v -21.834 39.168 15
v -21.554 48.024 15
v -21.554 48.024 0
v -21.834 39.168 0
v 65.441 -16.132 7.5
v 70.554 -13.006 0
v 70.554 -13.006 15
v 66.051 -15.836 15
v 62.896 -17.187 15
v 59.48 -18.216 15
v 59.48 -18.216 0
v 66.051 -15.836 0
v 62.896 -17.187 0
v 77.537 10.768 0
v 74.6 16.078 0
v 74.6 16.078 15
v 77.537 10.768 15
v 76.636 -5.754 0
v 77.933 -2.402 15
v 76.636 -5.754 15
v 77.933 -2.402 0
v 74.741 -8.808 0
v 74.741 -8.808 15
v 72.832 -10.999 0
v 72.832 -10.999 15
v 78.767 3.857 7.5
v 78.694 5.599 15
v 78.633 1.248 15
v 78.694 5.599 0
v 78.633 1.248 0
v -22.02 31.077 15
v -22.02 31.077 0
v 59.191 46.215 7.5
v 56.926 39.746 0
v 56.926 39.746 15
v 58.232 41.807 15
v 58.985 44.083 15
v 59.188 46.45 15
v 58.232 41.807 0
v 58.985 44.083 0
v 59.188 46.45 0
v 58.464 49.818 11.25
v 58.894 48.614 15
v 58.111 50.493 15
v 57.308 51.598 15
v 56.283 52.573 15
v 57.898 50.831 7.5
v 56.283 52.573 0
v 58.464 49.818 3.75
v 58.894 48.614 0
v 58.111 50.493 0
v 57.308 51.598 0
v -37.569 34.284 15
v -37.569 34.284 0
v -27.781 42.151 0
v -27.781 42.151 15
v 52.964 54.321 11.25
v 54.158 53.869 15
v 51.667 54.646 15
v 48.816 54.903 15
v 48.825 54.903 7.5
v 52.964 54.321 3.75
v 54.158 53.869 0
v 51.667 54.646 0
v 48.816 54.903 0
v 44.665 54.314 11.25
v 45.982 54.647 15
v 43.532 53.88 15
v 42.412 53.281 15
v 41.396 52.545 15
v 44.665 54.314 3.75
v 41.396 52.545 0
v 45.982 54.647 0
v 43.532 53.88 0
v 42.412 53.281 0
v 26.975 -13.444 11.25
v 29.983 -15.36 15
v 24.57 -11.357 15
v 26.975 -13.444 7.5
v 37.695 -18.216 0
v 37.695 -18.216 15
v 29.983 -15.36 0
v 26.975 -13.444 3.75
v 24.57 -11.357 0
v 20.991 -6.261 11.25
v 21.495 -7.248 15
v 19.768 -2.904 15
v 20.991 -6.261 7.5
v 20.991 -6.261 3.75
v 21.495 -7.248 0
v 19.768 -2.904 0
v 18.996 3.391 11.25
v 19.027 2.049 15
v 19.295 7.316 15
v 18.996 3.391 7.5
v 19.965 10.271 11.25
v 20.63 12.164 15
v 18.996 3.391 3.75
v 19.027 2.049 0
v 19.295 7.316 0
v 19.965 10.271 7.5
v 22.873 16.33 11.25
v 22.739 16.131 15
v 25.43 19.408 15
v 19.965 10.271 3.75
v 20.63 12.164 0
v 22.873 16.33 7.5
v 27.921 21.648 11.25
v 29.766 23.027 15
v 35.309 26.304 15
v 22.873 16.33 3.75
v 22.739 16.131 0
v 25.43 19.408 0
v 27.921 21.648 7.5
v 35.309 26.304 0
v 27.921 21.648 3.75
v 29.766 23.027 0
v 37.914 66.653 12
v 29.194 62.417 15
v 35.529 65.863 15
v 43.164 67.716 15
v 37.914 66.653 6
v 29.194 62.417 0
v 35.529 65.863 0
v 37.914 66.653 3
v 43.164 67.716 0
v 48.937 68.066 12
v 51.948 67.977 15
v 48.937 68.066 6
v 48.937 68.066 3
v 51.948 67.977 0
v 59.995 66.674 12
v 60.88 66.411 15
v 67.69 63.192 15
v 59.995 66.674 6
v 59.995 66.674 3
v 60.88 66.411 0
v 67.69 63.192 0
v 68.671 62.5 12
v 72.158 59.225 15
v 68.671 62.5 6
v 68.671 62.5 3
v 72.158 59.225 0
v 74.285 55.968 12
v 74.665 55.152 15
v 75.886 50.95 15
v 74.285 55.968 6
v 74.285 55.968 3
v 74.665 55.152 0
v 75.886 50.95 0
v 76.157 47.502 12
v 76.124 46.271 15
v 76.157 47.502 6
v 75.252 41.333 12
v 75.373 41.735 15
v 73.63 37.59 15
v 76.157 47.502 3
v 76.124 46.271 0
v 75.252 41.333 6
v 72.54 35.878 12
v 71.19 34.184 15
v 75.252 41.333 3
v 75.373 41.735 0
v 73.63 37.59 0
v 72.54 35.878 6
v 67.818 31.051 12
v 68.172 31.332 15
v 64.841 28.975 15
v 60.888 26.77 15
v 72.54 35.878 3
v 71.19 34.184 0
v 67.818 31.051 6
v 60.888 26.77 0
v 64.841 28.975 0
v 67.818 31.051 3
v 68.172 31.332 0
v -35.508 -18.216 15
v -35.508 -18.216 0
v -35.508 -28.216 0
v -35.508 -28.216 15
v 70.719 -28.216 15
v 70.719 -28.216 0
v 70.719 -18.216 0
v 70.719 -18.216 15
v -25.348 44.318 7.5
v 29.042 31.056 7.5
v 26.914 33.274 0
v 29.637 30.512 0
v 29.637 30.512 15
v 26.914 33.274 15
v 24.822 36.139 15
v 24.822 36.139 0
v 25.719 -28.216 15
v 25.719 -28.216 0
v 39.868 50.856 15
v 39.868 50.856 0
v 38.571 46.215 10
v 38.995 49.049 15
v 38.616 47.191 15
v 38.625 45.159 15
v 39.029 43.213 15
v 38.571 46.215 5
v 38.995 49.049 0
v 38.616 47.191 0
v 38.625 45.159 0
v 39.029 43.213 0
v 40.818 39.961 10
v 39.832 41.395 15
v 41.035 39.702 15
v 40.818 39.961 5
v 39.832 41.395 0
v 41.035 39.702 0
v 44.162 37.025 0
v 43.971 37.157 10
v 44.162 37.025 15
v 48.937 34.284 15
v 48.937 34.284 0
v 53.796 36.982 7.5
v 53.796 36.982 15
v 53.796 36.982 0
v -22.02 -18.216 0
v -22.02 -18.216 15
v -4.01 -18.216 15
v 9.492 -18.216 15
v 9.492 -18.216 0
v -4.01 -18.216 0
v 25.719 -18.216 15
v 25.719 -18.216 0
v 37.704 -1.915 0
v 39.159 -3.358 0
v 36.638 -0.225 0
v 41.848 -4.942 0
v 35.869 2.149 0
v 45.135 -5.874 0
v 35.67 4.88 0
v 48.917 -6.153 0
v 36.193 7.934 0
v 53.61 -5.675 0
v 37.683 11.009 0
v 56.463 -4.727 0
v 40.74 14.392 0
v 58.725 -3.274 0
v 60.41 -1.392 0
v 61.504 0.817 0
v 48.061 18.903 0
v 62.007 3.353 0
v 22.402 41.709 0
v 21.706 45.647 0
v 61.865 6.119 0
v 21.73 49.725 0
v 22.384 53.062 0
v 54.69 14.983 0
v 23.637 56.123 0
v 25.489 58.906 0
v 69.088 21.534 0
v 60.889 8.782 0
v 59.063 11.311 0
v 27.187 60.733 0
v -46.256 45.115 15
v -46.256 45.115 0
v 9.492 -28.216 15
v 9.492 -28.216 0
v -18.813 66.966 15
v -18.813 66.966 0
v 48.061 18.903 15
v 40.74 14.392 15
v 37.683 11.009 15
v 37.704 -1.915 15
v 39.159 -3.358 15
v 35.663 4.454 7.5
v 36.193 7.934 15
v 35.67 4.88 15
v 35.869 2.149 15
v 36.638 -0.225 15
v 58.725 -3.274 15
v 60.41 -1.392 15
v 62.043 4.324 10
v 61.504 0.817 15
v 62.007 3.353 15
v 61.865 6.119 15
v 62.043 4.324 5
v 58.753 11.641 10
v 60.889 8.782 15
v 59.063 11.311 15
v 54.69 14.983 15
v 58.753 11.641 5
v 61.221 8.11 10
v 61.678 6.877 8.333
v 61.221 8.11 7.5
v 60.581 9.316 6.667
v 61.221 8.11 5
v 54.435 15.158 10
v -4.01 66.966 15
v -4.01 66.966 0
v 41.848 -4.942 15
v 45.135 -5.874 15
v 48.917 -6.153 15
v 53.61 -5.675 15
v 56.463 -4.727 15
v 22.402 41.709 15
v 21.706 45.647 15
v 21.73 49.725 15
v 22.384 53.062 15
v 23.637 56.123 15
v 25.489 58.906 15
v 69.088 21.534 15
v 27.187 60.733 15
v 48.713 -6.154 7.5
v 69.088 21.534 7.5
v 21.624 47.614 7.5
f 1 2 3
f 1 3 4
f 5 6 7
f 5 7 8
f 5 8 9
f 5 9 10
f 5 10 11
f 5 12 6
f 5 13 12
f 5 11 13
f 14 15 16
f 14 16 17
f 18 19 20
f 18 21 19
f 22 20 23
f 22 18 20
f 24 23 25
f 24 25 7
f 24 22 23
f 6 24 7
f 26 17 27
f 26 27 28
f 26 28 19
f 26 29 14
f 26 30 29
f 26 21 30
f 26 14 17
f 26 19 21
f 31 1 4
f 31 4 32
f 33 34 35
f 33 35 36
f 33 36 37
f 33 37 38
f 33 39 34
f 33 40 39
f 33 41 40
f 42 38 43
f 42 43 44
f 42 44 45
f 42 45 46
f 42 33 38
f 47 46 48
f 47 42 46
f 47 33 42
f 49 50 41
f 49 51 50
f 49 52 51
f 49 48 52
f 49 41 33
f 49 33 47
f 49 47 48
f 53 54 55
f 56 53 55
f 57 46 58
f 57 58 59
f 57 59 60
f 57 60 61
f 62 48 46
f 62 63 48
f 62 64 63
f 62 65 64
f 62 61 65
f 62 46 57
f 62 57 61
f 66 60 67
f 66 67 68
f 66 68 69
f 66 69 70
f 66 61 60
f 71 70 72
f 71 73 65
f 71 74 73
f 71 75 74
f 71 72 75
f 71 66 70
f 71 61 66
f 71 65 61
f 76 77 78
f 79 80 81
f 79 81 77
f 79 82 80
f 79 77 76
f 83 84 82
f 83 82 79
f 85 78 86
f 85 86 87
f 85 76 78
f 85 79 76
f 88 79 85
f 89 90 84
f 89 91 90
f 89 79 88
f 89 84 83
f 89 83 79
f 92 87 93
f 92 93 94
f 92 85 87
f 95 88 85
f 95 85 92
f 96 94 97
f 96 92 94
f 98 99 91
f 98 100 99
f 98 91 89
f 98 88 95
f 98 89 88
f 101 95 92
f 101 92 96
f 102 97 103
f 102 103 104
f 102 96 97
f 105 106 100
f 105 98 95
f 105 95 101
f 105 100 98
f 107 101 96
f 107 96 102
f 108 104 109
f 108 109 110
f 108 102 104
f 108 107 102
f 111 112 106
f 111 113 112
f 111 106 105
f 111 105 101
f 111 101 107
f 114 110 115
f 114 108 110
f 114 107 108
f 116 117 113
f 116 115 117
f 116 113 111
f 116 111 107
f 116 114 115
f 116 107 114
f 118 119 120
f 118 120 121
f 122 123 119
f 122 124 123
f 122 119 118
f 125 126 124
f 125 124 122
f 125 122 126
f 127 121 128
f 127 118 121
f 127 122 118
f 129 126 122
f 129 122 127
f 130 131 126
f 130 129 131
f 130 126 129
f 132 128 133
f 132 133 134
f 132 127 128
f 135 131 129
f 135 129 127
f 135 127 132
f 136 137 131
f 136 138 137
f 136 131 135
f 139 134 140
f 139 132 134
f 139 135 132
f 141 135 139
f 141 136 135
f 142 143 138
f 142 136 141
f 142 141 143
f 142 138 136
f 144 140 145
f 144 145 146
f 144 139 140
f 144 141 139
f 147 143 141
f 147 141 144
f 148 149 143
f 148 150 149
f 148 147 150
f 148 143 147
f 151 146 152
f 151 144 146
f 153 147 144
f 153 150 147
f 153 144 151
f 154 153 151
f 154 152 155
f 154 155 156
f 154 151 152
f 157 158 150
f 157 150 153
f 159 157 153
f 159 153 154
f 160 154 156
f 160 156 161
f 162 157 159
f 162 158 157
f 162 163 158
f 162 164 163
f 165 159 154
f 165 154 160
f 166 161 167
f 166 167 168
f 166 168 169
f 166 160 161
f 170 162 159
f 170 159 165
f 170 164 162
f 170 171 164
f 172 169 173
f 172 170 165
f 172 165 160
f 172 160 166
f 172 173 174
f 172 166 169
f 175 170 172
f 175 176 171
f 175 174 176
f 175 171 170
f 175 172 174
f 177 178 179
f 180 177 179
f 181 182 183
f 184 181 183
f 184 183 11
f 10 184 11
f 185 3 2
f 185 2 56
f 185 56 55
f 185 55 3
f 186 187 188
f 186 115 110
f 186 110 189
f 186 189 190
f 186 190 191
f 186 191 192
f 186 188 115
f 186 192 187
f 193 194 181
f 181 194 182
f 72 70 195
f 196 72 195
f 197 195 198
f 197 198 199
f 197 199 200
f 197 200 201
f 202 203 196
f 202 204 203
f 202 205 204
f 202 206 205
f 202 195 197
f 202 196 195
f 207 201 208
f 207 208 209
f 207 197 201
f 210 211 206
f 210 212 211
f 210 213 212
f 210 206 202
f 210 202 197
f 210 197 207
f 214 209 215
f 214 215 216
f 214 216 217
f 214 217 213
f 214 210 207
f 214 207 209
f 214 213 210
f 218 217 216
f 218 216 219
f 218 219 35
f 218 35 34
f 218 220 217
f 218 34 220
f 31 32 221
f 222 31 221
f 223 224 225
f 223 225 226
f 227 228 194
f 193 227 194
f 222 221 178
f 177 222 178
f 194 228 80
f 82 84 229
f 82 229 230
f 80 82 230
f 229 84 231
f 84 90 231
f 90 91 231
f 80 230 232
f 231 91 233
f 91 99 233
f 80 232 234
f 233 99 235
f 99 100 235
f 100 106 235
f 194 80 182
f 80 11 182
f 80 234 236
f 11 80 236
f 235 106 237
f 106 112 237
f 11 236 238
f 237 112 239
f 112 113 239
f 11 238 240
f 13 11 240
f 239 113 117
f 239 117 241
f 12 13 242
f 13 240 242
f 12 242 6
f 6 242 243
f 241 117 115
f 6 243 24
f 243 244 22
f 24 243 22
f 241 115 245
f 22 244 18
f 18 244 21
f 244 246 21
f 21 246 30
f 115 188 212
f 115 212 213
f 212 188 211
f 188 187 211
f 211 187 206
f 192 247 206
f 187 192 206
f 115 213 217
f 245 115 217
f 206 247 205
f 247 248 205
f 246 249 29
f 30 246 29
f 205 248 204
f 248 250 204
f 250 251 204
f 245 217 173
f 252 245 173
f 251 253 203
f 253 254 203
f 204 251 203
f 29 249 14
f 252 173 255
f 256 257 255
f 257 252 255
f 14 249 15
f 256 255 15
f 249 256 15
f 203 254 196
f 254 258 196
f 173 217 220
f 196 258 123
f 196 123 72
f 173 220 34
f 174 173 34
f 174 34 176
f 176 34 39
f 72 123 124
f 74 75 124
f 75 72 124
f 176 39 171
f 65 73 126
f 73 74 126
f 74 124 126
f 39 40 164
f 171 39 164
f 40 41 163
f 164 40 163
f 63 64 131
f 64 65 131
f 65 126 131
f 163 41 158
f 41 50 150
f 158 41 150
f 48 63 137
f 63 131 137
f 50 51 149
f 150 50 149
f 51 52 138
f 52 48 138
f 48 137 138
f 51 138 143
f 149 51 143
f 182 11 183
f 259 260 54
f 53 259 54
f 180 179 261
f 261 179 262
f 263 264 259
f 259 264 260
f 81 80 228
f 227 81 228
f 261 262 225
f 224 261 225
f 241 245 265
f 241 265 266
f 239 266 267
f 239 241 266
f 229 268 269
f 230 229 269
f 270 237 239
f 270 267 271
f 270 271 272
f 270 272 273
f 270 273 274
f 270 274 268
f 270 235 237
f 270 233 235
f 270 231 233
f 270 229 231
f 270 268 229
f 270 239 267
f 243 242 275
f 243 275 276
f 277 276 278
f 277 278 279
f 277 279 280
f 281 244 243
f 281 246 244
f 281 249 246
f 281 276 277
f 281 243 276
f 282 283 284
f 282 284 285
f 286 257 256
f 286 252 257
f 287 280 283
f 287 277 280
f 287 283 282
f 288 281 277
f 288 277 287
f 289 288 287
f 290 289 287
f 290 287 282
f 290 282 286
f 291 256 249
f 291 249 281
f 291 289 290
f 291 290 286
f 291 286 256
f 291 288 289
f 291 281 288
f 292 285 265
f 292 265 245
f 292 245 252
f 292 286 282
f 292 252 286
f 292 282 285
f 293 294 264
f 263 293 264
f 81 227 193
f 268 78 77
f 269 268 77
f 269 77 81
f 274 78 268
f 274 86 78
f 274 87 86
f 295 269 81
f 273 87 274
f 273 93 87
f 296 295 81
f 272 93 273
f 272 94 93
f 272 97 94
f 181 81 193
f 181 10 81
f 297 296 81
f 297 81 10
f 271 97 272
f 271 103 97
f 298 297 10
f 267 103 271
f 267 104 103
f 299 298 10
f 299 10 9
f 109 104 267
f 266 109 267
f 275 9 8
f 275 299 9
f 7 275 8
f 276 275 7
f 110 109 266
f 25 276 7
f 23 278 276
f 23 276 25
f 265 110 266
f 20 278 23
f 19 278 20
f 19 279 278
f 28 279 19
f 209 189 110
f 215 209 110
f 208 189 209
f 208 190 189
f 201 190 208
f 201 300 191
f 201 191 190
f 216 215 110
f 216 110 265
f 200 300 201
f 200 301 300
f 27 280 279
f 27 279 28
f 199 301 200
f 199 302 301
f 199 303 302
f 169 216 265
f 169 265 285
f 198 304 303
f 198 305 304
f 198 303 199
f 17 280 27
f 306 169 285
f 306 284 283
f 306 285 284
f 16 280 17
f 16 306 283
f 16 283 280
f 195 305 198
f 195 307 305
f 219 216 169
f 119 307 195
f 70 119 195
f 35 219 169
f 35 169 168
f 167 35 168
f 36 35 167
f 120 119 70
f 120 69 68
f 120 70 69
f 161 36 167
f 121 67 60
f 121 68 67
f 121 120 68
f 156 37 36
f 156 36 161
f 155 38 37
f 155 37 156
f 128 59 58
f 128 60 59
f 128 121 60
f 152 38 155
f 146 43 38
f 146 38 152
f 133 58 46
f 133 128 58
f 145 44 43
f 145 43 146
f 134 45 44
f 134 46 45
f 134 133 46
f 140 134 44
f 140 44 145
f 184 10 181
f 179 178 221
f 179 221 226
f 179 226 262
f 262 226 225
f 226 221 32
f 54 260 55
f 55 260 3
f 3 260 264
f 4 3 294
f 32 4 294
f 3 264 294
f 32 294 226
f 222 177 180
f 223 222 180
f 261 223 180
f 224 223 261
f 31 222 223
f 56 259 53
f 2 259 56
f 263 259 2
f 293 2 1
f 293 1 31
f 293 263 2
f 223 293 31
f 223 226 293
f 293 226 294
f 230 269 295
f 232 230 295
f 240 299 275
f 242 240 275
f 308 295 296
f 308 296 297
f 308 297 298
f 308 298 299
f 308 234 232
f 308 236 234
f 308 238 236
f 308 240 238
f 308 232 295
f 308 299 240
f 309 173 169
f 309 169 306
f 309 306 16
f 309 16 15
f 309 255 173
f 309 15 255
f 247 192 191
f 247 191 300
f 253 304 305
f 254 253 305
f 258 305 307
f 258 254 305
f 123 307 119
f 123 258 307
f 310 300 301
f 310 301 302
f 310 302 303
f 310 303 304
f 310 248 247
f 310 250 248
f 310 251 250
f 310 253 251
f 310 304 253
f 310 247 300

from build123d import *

# Parameters (mm, degrees)
F1_DEPTH = 15


with BuildPart() as f1:
    # F0 (on Top) → F1 (new body)
    with BuildSketch(Plane.XY):
        Polygon((-22.0199770812, -18.2164191203), (-35.5078747675, -18.2164191203), (-35.5078747675, -28.2164191203), (9.4921252325, -28.2164191203), (9.4921252325, -18.2164191203), (-4.010385738, -18.2164191203), align=None)
        with BuildLine():
            Line((-22.0199770812, 31.0769137073), (-22.0199770812, -18.2164191203))
            Line((-22.0199770812, -18.2164191203), (-4.010385738, -18.2164191203))
            Line((-4.010385738, -18.2164191203), (-4.010385738, 66.9655921087))
            Line((-4.010385738, 66.9655921087), (-18.8133003617, 66.9655921087))
            Line((-18.8133003617, 66.9655921087), (-46.2564871704, 45.1154460898))
            Line((-46.2564871704, 45.1154460898), (-37.5686304769, 34.2835904268))
            Line((-37.5686304769, 34.2835904268), (-27.7808090947, 42.1511344712))
            add(Edge.make_bspline(
                [(-21.5538903487, 48.0238273005), (-26.0283229806, 43.5493946686), (-27.7808090947, 42.1511344712)],
                knots=[0, 0, 0, 1, 1, 1], degree=2))
            Line((-21.5538903487, 48.0238273005), (-21.8335423882, 39.1681793833))
            Line((-21.8335423882, 39.1681793833), (-22.0199770812, 31.0769137073))
        make_face()
        with BuildLine():
            Line((37.6948895546, -18.2164191203), (25.7190672784, -18.2164191203))
            Line((25.7190672784, -18.2164191203), (25.7190672784, -28.2164191203))
            Line((25.7190672784, -28.2164191203), (70.7190672784, -28.2164191203))
            Line((70.7190672784, -28.2164191203), (70.7190672784, -18.2164191203))
            Line((70.7190672784, -18.2164191203), (59.4800917066, -18.2164191203))
            add(Edge.make_bspline(
                [(59.4800917066, -18.2164191203), (54.6861107626, -19.3909576862), (48.9370670724, -19.3909576862)],
                knots=[0.5711158597, 0.5711158597, 0.5711158597, 1, 1, 1], degree=2))
            add(Edge.make_bspline(
                [(48.9370670724, -19.3909576862), (42.7231861219, -19.3909576862), (37.6948895546, -18.2164191203)],
                knots=[0, 0, 0, 0.4444009035, 0.4444009035, 0.4444009035], degree=2))
        make_face()
        with BuildLine():
            add(Edge.make_bspline(
                [(37.6948895546, -18.2164191203), (31.4084103688, -16.7479869886), (26.9750602377, -13.4436909797)],
                knots=[0.4444009035, 0.4444009035, 0.4444009035, 1, 1, 1], degree=2))
            Line((37.6948895546, -18.2164191203), (59.4800917066, -18.2164191203))
            add(Edge.make_bspline(
                [(70.554169725, -13.0055694511), (65.8639102964, -16.6523659422), (59.4800917066, -18.2164191203)],
                knots=[0, 0, 0, 0.5711158597, 0.5711158597, 0.5711158597], degree=2))
            add(Edge.make_bspline(
                [(78.7666179514, 3.8574485302), (78.7666179514, -6.6201812161), (70.554169725, -13.0055694511)],
                knots=[0, 0, 0, 1, 1, 1], degree=2))
            add(Edge.make_bspline(
                [(74.599802563, 16.0782426559), (78.7666179514, 10.5131670701), (78.7666179514, 3.8574485302)],
                knots=[0, 0, 0, 1, 1, 1], degree=2))
            add(Edge.make_bspline(
                [(60.8875308933, 26.7702722992), (70.4329871746, 21.6433182418), (74.599802563, 16.0782426559)],
                knots=[0, 0, 0, 1, 1, 1], degree=2))
            add(Edge.make_bspline(
                [(72.5396992054, 35.8776070519), (68.9228661613, 30.7786181985), (60.8875308933, 26.7702722992)],
                knots=[0, 0, 0, 1, 1, 1], degree=2))
            add(Edge.make_bspline(
                [(76.1565322495, 47.5018101601), (76.1565322495, 40.9765959053), (72.5396992054, 35.8776070519)],
                knots=[0, 0, 0, 1, 1, 1], degree=2))
            add(Edge.make_bspline(
                [(68.6711793258, 62.5004812115), (76.1565322495, 56.9354056256), (76.1565322495, 47.5018101601)],
                knots=[0, 0, 0, 1, 1, 1], degree=2))
            add(Edge.make_bspline(
                [(48.9370670724, 68.0655567974), (61.1858264021, 68.0655567974), (68.6711793258, 62.5004812115)],
                knots=[0, 0, 0, 1, 1, 1], degree=2))
            add(Edge.make_bspline(
                [(29.1936330843, 62.4165855996), (36.7628816199, 68.0655567974), (48.9370670724, 68.0655567974)],
                knots=[0, 0, 0, 1, 1, 1], degree=2))
            add(Edge.make_bspline(
                [(21.6243845487, 47.6136709759), (21.6243845487, 56.7676144019), (29.1936330843, 62.4165855996)],
                knots=[0, 0, 0, 1, 1, 1], degree=2))
            add(Edge.make_bspline(
                [(24.8217395336, 36.1386156221), (21.6243845487, 41.3867522299), (21.6243845487, 47.6136709759)],
                knots=[0, 0, 0, 1, 1, 1], degree=2))
            add(Edge.make_bspline(
                [(35.3086910145, 26.3041855667), (28.0190945184, 30.8904790143), (24.8217395336, 36.1386156221)],
                knots=[0, 0, 0, 1, 1, 1], degree=2))
            add(Edge.make_bspline(
                [(22.8734969918, 16.3299294915), (26.7513386061, 21.9789006892), (35.3086910145, 26.3041855667)],
                knots=[0, 0, 0, 1, 1, 1], degree=2))
            add(Edge.make_bspline(
                [(18.9956553775, 3.3913617977), (18.9956553775, 10.6809582938), (22.8734969918, 16.3299294915)],
                knots=[0, 0, 0, 1, 1, 1], degree=2))
            add(Edge.make_bspline(
                [(26.9750602377, -13.4436909797), (18.9956553775, -7.4964242732), (18.9956553775, 3.3913617977)],
                knots=[0, 0, 0, 1, 1, 1], degree=2))
        make_face()
        with BuildLine():
            add(Edge.make_bspline(
                [(35.6629169312, 4.4540395478), (35.6629169312, -0.5610536938), (39.1585674248, -3.3575740887)],
                knots=[0, 0, 0, 1, 1, 1], degree=2))
            add(Edge.make_bspline(
                [(48.0608240153, 18.9027282548), (35.6629169312, 13.1791831799), (35.6629169312, 4.4540395478)],
                knots=[0, 0, 0, 1, 1, 1], degree=2))
            add(Edge.make_bspline(
                [(58.7528536585, 11.6410969627), (55.4622813272, 15.0435301098), (48.0608240153, 18.9027282548)],
                knots=[0, 0, 0, 1, 1, 1], degree=2))
            add(Edge.make_bspline(
                [(62.0434259899, 4.3235352627), (62.0434259899, 8.2386638155), (58.7528536585, 11.6410969627)],
                knots=[0, 0, 0, 1, 1, 1], degree=2))
            add(Edge.make_bspline(
                [(58.7248884546, -3.2736784769), (62.0434259899, -0.3932624701), (62.0434259899, 4.3235352627)],
                knots=[0, 0, 0, 1, 1, 1], degree=2))
            add(Edge.make_bspline(
                [(48.7133454408, -6.1540944836), (55.4063509193, -6.1540944836), (58.7248884546, -3.2736784769)],
                knots=[0, 0, 0, 1, 1, 1], degree=2))
            add(Edge.make_bspline(
                [(39.1585674248, -3.3575740887), (42.6542179185, -6.1540944836), (48.7133454408, -6.1540944836)],
                knots=[0, 0, 0, 1, 1, 1], degree=2))
        make_face(mode=Mode.SUBTRACT)
        with BuildLine():
            add(Edge.make_bspline(
                [(48.8252062566, 54.903267472), (44.2202693396, 54.903267472), (41.3957837408, 52.5448686056)],
                knots=[0, 0, 0, 1, 1, 1], degree=2))
            add(Edge.make_bspline(
                [(56.2825939763, 52.5728338095), (53.3742127656, 54.903267472), (48.8252062566, 54.903267472)],
                knots=[0, 0, 0, 1, 1, 1], degree=2))
            add(Edge.make_bspline(
                [(59.1909751871, 46.2154107784), (59.1909751871, 50.2424001471), (56.2825939763, 52.5728338095)],
                knots=[0, 0, 0, 1, 1, 1], degree=2))
            add(Edge.make_bspline(
                [(56.9257936672, 39.7461269315), (59.1909751871, 42.5426473265), (59.1909751871, 46.2154107784)],
                knots=[0, 0, 0, 1, 1, 1], degree=2))
            add(Edge.make_bspline(
                [(48.9370670724, 34.2835904268), (54.6606121473, 36.9496065366), (56.9257936672, 39.7461269315)],
                knots=[0, 0, 0, 1, 1, 1], degree=2))
            add(Edge.make_bspline(
                [(40.8178361925, 39.9605268285), (43.0643742431, 37.1919716375), (48.9370670724, 34.2835904268)],
                knots=[0, 0, 0, 1, 1, 1], degree=2))
            add(Edge.make_bspline(
                [(38.5712981419, 46.2154107784), (38.5712981419, 42.7290820195), (40.8178361925, 39.9605268285)],
                knots=[0, 0, 0, 1, 1, 1], degree=2))
            add(Edge.make_bspline(
                [(41.3957837408, 52.5448686056), (38.5712981419, 50.1864697392), (38.5712981419, 46.2154107784)],
                knots=[0, 0, 0, 1, 1, 1], degree=2))
        make_face(mode=Mode.SUBTRACT)
        with BuildLine():
            Line((59.4800917066, -18.2164191203), (37.6948895546, -18.2164191203))
            add(Edge.make_bspline(
                [(48.9370670724, -19.3909576862), (42.7231861219, -19.3909576862), (37.6948895546, -18.2164191203)],
                knots=[0, 0, 0, 0.4444009035, 0.4444009035, 0.4444009035], degree=2))
            add(Edge.make_bspline(
                [(59.4800917066, -18.2164191203), (54.6861107626, -19.3909576862), (48.9370670724, -19.3909576862)],
                knots=[0.5711158597, 0.5711158597, 0.5711158597, 1, 1, 1], degree=2))
        make_face()
    extrude(amount=F1_DEPTH)


solid = f1.part
